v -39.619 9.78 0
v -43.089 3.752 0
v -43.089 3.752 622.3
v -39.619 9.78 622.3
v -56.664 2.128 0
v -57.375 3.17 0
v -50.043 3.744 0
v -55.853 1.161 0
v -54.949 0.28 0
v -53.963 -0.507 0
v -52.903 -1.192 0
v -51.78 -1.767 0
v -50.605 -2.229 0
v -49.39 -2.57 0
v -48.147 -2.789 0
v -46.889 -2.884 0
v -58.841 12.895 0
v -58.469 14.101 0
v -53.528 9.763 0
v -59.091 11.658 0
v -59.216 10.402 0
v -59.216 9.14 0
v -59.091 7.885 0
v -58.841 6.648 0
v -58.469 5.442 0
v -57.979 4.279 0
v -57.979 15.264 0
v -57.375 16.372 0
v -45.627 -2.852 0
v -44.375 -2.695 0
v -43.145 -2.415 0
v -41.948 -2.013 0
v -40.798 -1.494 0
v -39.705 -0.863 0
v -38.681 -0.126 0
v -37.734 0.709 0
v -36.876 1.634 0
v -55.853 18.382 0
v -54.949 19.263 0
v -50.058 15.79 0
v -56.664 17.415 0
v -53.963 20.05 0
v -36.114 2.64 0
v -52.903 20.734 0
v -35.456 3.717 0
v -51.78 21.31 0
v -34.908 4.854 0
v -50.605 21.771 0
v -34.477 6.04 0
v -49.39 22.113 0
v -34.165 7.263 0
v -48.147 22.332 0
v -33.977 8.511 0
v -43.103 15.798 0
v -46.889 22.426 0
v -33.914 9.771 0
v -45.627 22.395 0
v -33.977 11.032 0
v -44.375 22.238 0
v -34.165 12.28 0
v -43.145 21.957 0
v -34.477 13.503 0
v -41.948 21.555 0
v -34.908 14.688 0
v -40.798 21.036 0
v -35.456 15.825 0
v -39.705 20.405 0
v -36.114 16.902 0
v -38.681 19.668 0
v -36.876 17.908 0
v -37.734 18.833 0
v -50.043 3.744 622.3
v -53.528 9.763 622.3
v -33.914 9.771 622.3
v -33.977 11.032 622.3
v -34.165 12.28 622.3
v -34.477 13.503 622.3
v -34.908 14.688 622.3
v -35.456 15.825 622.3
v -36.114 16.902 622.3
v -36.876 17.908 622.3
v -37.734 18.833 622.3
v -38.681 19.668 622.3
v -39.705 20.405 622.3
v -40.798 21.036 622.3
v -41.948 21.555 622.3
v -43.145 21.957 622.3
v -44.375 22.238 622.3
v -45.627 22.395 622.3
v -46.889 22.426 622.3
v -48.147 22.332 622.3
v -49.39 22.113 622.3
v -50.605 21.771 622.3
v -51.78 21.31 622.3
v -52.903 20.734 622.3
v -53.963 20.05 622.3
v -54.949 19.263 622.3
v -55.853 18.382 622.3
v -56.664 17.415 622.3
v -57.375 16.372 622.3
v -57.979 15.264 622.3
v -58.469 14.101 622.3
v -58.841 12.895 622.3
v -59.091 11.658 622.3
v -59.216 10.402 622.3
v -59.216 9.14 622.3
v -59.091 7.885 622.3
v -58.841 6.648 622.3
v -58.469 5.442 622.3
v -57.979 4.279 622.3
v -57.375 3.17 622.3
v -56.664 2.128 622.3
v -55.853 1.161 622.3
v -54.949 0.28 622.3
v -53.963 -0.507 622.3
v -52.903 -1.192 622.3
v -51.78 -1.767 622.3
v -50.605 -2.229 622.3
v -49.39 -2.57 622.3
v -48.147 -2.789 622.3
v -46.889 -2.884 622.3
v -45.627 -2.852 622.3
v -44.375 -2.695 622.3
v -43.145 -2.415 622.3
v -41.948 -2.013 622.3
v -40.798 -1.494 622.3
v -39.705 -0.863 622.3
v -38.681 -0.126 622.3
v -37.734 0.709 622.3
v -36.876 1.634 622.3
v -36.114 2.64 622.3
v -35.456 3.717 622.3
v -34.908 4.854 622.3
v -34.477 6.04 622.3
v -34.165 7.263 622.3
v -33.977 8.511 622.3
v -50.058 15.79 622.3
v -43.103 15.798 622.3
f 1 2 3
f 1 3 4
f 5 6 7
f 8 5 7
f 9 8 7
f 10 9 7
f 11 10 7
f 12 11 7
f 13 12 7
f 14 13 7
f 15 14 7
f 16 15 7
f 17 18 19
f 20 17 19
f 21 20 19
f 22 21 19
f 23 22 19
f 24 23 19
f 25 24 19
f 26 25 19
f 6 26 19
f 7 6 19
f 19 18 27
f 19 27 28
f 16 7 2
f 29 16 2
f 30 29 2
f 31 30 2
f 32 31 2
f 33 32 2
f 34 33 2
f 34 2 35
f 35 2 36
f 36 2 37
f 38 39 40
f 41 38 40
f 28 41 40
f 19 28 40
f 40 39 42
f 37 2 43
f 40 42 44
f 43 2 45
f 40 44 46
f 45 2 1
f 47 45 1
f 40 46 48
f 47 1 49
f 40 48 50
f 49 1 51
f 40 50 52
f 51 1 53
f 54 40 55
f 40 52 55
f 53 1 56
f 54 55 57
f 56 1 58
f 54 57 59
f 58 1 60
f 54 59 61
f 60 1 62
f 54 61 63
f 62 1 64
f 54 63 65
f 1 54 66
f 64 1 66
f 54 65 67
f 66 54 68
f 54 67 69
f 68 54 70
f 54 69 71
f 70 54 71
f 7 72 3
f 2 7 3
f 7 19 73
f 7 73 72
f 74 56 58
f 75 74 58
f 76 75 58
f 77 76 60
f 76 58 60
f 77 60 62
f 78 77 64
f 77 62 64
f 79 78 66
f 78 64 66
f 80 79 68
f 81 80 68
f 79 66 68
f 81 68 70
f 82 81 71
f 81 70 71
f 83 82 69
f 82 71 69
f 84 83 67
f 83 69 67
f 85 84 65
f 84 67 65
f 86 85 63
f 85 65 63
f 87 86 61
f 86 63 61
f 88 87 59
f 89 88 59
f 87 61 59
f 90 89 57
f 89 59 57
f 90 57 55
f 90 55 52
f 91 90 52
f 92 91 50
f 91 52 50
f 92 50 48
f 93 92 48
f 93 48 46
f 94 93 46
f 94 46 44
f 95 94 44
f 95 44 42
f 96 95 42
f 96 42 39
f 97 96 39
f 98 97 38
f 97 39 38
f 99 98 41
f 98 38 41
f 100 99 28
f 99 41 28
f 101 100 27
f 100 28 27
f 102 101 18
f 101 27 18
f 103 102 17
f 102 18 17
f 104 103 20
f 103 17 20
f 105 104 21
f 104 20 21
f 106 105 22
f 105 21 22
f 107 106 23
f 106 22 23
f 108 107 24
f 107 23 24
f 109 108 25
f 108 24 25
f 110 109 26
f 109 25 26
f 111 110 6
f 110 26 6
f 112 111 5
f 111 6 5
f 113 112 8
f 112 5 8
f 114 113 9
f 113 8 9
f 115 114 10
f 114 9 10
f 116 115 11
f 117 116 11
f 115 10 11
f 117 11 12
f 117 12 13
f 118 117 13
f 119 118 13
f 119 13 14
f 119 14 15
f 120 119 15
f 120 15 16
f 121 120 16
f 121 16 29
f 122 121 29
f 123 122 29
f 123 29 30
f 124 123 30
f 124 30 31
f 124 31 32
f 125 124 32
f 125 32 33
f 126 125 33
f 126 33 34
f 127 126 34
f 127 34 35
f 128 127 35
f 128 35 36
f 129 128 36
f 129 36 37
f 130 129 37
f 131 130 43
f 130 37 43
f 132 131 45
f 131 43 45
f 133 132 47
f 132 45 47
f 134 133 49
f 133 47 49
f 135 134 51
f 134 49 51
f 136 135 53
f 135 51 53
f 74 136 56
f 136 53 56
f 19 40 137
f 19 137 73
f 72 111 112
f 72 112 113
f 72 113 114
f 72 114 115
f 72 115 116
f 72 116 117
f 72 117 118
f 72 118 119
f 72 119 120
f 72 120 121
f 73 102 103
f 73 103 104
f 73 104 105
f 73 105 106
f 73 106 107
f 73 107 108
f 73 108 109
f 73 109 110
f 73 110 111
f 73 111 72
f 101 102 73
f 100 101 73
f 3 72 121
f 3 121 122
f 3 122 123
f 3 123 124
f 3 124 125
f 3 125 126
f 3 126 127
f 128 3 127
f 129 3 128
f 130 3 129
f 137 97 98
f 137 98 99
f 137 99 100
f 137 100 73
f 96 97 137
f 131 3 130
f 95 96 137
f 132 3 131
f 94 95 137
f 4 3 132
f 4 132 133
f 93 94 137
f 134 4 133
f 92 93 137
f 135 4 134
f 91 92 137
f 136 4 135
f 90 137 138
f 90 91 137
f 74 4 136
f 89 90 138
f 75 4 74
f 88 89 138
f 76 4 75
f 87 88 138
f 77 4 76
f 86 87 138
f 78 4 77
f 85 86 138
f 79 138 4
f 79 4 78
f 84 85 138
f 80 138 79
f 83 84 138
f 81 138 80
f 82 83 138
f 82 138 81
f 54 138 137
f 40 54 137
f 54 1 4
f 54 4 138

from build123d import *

# Parameters (mm, degrees)
SKETCH2_R           = 12.658951853
BOSS_EXTRUDE4_DEPTH = 622.3


with BuildPart() as part:
    # Sketch2 → Boss-Extrude4 (new body)
    with BuildSketch(Plane.XY):
        with Locations((-46.573237559, 9.77124788)):
            Circle(SKETCH2_R)
        Polygon((-43.103074761, 15.798372741), (-50.057799401, 15.790059449), (-53.5279622, 9.762934589), (-50.043400358, 3.744123019), (-43.088675718, 3.752436311), (-39.618512919, 9.779561172), align=None, mode=Mode.SUBTRACT)
    extrude(amount=BOSS_EXTRUDE4_DEPTH)


solid = part.part
